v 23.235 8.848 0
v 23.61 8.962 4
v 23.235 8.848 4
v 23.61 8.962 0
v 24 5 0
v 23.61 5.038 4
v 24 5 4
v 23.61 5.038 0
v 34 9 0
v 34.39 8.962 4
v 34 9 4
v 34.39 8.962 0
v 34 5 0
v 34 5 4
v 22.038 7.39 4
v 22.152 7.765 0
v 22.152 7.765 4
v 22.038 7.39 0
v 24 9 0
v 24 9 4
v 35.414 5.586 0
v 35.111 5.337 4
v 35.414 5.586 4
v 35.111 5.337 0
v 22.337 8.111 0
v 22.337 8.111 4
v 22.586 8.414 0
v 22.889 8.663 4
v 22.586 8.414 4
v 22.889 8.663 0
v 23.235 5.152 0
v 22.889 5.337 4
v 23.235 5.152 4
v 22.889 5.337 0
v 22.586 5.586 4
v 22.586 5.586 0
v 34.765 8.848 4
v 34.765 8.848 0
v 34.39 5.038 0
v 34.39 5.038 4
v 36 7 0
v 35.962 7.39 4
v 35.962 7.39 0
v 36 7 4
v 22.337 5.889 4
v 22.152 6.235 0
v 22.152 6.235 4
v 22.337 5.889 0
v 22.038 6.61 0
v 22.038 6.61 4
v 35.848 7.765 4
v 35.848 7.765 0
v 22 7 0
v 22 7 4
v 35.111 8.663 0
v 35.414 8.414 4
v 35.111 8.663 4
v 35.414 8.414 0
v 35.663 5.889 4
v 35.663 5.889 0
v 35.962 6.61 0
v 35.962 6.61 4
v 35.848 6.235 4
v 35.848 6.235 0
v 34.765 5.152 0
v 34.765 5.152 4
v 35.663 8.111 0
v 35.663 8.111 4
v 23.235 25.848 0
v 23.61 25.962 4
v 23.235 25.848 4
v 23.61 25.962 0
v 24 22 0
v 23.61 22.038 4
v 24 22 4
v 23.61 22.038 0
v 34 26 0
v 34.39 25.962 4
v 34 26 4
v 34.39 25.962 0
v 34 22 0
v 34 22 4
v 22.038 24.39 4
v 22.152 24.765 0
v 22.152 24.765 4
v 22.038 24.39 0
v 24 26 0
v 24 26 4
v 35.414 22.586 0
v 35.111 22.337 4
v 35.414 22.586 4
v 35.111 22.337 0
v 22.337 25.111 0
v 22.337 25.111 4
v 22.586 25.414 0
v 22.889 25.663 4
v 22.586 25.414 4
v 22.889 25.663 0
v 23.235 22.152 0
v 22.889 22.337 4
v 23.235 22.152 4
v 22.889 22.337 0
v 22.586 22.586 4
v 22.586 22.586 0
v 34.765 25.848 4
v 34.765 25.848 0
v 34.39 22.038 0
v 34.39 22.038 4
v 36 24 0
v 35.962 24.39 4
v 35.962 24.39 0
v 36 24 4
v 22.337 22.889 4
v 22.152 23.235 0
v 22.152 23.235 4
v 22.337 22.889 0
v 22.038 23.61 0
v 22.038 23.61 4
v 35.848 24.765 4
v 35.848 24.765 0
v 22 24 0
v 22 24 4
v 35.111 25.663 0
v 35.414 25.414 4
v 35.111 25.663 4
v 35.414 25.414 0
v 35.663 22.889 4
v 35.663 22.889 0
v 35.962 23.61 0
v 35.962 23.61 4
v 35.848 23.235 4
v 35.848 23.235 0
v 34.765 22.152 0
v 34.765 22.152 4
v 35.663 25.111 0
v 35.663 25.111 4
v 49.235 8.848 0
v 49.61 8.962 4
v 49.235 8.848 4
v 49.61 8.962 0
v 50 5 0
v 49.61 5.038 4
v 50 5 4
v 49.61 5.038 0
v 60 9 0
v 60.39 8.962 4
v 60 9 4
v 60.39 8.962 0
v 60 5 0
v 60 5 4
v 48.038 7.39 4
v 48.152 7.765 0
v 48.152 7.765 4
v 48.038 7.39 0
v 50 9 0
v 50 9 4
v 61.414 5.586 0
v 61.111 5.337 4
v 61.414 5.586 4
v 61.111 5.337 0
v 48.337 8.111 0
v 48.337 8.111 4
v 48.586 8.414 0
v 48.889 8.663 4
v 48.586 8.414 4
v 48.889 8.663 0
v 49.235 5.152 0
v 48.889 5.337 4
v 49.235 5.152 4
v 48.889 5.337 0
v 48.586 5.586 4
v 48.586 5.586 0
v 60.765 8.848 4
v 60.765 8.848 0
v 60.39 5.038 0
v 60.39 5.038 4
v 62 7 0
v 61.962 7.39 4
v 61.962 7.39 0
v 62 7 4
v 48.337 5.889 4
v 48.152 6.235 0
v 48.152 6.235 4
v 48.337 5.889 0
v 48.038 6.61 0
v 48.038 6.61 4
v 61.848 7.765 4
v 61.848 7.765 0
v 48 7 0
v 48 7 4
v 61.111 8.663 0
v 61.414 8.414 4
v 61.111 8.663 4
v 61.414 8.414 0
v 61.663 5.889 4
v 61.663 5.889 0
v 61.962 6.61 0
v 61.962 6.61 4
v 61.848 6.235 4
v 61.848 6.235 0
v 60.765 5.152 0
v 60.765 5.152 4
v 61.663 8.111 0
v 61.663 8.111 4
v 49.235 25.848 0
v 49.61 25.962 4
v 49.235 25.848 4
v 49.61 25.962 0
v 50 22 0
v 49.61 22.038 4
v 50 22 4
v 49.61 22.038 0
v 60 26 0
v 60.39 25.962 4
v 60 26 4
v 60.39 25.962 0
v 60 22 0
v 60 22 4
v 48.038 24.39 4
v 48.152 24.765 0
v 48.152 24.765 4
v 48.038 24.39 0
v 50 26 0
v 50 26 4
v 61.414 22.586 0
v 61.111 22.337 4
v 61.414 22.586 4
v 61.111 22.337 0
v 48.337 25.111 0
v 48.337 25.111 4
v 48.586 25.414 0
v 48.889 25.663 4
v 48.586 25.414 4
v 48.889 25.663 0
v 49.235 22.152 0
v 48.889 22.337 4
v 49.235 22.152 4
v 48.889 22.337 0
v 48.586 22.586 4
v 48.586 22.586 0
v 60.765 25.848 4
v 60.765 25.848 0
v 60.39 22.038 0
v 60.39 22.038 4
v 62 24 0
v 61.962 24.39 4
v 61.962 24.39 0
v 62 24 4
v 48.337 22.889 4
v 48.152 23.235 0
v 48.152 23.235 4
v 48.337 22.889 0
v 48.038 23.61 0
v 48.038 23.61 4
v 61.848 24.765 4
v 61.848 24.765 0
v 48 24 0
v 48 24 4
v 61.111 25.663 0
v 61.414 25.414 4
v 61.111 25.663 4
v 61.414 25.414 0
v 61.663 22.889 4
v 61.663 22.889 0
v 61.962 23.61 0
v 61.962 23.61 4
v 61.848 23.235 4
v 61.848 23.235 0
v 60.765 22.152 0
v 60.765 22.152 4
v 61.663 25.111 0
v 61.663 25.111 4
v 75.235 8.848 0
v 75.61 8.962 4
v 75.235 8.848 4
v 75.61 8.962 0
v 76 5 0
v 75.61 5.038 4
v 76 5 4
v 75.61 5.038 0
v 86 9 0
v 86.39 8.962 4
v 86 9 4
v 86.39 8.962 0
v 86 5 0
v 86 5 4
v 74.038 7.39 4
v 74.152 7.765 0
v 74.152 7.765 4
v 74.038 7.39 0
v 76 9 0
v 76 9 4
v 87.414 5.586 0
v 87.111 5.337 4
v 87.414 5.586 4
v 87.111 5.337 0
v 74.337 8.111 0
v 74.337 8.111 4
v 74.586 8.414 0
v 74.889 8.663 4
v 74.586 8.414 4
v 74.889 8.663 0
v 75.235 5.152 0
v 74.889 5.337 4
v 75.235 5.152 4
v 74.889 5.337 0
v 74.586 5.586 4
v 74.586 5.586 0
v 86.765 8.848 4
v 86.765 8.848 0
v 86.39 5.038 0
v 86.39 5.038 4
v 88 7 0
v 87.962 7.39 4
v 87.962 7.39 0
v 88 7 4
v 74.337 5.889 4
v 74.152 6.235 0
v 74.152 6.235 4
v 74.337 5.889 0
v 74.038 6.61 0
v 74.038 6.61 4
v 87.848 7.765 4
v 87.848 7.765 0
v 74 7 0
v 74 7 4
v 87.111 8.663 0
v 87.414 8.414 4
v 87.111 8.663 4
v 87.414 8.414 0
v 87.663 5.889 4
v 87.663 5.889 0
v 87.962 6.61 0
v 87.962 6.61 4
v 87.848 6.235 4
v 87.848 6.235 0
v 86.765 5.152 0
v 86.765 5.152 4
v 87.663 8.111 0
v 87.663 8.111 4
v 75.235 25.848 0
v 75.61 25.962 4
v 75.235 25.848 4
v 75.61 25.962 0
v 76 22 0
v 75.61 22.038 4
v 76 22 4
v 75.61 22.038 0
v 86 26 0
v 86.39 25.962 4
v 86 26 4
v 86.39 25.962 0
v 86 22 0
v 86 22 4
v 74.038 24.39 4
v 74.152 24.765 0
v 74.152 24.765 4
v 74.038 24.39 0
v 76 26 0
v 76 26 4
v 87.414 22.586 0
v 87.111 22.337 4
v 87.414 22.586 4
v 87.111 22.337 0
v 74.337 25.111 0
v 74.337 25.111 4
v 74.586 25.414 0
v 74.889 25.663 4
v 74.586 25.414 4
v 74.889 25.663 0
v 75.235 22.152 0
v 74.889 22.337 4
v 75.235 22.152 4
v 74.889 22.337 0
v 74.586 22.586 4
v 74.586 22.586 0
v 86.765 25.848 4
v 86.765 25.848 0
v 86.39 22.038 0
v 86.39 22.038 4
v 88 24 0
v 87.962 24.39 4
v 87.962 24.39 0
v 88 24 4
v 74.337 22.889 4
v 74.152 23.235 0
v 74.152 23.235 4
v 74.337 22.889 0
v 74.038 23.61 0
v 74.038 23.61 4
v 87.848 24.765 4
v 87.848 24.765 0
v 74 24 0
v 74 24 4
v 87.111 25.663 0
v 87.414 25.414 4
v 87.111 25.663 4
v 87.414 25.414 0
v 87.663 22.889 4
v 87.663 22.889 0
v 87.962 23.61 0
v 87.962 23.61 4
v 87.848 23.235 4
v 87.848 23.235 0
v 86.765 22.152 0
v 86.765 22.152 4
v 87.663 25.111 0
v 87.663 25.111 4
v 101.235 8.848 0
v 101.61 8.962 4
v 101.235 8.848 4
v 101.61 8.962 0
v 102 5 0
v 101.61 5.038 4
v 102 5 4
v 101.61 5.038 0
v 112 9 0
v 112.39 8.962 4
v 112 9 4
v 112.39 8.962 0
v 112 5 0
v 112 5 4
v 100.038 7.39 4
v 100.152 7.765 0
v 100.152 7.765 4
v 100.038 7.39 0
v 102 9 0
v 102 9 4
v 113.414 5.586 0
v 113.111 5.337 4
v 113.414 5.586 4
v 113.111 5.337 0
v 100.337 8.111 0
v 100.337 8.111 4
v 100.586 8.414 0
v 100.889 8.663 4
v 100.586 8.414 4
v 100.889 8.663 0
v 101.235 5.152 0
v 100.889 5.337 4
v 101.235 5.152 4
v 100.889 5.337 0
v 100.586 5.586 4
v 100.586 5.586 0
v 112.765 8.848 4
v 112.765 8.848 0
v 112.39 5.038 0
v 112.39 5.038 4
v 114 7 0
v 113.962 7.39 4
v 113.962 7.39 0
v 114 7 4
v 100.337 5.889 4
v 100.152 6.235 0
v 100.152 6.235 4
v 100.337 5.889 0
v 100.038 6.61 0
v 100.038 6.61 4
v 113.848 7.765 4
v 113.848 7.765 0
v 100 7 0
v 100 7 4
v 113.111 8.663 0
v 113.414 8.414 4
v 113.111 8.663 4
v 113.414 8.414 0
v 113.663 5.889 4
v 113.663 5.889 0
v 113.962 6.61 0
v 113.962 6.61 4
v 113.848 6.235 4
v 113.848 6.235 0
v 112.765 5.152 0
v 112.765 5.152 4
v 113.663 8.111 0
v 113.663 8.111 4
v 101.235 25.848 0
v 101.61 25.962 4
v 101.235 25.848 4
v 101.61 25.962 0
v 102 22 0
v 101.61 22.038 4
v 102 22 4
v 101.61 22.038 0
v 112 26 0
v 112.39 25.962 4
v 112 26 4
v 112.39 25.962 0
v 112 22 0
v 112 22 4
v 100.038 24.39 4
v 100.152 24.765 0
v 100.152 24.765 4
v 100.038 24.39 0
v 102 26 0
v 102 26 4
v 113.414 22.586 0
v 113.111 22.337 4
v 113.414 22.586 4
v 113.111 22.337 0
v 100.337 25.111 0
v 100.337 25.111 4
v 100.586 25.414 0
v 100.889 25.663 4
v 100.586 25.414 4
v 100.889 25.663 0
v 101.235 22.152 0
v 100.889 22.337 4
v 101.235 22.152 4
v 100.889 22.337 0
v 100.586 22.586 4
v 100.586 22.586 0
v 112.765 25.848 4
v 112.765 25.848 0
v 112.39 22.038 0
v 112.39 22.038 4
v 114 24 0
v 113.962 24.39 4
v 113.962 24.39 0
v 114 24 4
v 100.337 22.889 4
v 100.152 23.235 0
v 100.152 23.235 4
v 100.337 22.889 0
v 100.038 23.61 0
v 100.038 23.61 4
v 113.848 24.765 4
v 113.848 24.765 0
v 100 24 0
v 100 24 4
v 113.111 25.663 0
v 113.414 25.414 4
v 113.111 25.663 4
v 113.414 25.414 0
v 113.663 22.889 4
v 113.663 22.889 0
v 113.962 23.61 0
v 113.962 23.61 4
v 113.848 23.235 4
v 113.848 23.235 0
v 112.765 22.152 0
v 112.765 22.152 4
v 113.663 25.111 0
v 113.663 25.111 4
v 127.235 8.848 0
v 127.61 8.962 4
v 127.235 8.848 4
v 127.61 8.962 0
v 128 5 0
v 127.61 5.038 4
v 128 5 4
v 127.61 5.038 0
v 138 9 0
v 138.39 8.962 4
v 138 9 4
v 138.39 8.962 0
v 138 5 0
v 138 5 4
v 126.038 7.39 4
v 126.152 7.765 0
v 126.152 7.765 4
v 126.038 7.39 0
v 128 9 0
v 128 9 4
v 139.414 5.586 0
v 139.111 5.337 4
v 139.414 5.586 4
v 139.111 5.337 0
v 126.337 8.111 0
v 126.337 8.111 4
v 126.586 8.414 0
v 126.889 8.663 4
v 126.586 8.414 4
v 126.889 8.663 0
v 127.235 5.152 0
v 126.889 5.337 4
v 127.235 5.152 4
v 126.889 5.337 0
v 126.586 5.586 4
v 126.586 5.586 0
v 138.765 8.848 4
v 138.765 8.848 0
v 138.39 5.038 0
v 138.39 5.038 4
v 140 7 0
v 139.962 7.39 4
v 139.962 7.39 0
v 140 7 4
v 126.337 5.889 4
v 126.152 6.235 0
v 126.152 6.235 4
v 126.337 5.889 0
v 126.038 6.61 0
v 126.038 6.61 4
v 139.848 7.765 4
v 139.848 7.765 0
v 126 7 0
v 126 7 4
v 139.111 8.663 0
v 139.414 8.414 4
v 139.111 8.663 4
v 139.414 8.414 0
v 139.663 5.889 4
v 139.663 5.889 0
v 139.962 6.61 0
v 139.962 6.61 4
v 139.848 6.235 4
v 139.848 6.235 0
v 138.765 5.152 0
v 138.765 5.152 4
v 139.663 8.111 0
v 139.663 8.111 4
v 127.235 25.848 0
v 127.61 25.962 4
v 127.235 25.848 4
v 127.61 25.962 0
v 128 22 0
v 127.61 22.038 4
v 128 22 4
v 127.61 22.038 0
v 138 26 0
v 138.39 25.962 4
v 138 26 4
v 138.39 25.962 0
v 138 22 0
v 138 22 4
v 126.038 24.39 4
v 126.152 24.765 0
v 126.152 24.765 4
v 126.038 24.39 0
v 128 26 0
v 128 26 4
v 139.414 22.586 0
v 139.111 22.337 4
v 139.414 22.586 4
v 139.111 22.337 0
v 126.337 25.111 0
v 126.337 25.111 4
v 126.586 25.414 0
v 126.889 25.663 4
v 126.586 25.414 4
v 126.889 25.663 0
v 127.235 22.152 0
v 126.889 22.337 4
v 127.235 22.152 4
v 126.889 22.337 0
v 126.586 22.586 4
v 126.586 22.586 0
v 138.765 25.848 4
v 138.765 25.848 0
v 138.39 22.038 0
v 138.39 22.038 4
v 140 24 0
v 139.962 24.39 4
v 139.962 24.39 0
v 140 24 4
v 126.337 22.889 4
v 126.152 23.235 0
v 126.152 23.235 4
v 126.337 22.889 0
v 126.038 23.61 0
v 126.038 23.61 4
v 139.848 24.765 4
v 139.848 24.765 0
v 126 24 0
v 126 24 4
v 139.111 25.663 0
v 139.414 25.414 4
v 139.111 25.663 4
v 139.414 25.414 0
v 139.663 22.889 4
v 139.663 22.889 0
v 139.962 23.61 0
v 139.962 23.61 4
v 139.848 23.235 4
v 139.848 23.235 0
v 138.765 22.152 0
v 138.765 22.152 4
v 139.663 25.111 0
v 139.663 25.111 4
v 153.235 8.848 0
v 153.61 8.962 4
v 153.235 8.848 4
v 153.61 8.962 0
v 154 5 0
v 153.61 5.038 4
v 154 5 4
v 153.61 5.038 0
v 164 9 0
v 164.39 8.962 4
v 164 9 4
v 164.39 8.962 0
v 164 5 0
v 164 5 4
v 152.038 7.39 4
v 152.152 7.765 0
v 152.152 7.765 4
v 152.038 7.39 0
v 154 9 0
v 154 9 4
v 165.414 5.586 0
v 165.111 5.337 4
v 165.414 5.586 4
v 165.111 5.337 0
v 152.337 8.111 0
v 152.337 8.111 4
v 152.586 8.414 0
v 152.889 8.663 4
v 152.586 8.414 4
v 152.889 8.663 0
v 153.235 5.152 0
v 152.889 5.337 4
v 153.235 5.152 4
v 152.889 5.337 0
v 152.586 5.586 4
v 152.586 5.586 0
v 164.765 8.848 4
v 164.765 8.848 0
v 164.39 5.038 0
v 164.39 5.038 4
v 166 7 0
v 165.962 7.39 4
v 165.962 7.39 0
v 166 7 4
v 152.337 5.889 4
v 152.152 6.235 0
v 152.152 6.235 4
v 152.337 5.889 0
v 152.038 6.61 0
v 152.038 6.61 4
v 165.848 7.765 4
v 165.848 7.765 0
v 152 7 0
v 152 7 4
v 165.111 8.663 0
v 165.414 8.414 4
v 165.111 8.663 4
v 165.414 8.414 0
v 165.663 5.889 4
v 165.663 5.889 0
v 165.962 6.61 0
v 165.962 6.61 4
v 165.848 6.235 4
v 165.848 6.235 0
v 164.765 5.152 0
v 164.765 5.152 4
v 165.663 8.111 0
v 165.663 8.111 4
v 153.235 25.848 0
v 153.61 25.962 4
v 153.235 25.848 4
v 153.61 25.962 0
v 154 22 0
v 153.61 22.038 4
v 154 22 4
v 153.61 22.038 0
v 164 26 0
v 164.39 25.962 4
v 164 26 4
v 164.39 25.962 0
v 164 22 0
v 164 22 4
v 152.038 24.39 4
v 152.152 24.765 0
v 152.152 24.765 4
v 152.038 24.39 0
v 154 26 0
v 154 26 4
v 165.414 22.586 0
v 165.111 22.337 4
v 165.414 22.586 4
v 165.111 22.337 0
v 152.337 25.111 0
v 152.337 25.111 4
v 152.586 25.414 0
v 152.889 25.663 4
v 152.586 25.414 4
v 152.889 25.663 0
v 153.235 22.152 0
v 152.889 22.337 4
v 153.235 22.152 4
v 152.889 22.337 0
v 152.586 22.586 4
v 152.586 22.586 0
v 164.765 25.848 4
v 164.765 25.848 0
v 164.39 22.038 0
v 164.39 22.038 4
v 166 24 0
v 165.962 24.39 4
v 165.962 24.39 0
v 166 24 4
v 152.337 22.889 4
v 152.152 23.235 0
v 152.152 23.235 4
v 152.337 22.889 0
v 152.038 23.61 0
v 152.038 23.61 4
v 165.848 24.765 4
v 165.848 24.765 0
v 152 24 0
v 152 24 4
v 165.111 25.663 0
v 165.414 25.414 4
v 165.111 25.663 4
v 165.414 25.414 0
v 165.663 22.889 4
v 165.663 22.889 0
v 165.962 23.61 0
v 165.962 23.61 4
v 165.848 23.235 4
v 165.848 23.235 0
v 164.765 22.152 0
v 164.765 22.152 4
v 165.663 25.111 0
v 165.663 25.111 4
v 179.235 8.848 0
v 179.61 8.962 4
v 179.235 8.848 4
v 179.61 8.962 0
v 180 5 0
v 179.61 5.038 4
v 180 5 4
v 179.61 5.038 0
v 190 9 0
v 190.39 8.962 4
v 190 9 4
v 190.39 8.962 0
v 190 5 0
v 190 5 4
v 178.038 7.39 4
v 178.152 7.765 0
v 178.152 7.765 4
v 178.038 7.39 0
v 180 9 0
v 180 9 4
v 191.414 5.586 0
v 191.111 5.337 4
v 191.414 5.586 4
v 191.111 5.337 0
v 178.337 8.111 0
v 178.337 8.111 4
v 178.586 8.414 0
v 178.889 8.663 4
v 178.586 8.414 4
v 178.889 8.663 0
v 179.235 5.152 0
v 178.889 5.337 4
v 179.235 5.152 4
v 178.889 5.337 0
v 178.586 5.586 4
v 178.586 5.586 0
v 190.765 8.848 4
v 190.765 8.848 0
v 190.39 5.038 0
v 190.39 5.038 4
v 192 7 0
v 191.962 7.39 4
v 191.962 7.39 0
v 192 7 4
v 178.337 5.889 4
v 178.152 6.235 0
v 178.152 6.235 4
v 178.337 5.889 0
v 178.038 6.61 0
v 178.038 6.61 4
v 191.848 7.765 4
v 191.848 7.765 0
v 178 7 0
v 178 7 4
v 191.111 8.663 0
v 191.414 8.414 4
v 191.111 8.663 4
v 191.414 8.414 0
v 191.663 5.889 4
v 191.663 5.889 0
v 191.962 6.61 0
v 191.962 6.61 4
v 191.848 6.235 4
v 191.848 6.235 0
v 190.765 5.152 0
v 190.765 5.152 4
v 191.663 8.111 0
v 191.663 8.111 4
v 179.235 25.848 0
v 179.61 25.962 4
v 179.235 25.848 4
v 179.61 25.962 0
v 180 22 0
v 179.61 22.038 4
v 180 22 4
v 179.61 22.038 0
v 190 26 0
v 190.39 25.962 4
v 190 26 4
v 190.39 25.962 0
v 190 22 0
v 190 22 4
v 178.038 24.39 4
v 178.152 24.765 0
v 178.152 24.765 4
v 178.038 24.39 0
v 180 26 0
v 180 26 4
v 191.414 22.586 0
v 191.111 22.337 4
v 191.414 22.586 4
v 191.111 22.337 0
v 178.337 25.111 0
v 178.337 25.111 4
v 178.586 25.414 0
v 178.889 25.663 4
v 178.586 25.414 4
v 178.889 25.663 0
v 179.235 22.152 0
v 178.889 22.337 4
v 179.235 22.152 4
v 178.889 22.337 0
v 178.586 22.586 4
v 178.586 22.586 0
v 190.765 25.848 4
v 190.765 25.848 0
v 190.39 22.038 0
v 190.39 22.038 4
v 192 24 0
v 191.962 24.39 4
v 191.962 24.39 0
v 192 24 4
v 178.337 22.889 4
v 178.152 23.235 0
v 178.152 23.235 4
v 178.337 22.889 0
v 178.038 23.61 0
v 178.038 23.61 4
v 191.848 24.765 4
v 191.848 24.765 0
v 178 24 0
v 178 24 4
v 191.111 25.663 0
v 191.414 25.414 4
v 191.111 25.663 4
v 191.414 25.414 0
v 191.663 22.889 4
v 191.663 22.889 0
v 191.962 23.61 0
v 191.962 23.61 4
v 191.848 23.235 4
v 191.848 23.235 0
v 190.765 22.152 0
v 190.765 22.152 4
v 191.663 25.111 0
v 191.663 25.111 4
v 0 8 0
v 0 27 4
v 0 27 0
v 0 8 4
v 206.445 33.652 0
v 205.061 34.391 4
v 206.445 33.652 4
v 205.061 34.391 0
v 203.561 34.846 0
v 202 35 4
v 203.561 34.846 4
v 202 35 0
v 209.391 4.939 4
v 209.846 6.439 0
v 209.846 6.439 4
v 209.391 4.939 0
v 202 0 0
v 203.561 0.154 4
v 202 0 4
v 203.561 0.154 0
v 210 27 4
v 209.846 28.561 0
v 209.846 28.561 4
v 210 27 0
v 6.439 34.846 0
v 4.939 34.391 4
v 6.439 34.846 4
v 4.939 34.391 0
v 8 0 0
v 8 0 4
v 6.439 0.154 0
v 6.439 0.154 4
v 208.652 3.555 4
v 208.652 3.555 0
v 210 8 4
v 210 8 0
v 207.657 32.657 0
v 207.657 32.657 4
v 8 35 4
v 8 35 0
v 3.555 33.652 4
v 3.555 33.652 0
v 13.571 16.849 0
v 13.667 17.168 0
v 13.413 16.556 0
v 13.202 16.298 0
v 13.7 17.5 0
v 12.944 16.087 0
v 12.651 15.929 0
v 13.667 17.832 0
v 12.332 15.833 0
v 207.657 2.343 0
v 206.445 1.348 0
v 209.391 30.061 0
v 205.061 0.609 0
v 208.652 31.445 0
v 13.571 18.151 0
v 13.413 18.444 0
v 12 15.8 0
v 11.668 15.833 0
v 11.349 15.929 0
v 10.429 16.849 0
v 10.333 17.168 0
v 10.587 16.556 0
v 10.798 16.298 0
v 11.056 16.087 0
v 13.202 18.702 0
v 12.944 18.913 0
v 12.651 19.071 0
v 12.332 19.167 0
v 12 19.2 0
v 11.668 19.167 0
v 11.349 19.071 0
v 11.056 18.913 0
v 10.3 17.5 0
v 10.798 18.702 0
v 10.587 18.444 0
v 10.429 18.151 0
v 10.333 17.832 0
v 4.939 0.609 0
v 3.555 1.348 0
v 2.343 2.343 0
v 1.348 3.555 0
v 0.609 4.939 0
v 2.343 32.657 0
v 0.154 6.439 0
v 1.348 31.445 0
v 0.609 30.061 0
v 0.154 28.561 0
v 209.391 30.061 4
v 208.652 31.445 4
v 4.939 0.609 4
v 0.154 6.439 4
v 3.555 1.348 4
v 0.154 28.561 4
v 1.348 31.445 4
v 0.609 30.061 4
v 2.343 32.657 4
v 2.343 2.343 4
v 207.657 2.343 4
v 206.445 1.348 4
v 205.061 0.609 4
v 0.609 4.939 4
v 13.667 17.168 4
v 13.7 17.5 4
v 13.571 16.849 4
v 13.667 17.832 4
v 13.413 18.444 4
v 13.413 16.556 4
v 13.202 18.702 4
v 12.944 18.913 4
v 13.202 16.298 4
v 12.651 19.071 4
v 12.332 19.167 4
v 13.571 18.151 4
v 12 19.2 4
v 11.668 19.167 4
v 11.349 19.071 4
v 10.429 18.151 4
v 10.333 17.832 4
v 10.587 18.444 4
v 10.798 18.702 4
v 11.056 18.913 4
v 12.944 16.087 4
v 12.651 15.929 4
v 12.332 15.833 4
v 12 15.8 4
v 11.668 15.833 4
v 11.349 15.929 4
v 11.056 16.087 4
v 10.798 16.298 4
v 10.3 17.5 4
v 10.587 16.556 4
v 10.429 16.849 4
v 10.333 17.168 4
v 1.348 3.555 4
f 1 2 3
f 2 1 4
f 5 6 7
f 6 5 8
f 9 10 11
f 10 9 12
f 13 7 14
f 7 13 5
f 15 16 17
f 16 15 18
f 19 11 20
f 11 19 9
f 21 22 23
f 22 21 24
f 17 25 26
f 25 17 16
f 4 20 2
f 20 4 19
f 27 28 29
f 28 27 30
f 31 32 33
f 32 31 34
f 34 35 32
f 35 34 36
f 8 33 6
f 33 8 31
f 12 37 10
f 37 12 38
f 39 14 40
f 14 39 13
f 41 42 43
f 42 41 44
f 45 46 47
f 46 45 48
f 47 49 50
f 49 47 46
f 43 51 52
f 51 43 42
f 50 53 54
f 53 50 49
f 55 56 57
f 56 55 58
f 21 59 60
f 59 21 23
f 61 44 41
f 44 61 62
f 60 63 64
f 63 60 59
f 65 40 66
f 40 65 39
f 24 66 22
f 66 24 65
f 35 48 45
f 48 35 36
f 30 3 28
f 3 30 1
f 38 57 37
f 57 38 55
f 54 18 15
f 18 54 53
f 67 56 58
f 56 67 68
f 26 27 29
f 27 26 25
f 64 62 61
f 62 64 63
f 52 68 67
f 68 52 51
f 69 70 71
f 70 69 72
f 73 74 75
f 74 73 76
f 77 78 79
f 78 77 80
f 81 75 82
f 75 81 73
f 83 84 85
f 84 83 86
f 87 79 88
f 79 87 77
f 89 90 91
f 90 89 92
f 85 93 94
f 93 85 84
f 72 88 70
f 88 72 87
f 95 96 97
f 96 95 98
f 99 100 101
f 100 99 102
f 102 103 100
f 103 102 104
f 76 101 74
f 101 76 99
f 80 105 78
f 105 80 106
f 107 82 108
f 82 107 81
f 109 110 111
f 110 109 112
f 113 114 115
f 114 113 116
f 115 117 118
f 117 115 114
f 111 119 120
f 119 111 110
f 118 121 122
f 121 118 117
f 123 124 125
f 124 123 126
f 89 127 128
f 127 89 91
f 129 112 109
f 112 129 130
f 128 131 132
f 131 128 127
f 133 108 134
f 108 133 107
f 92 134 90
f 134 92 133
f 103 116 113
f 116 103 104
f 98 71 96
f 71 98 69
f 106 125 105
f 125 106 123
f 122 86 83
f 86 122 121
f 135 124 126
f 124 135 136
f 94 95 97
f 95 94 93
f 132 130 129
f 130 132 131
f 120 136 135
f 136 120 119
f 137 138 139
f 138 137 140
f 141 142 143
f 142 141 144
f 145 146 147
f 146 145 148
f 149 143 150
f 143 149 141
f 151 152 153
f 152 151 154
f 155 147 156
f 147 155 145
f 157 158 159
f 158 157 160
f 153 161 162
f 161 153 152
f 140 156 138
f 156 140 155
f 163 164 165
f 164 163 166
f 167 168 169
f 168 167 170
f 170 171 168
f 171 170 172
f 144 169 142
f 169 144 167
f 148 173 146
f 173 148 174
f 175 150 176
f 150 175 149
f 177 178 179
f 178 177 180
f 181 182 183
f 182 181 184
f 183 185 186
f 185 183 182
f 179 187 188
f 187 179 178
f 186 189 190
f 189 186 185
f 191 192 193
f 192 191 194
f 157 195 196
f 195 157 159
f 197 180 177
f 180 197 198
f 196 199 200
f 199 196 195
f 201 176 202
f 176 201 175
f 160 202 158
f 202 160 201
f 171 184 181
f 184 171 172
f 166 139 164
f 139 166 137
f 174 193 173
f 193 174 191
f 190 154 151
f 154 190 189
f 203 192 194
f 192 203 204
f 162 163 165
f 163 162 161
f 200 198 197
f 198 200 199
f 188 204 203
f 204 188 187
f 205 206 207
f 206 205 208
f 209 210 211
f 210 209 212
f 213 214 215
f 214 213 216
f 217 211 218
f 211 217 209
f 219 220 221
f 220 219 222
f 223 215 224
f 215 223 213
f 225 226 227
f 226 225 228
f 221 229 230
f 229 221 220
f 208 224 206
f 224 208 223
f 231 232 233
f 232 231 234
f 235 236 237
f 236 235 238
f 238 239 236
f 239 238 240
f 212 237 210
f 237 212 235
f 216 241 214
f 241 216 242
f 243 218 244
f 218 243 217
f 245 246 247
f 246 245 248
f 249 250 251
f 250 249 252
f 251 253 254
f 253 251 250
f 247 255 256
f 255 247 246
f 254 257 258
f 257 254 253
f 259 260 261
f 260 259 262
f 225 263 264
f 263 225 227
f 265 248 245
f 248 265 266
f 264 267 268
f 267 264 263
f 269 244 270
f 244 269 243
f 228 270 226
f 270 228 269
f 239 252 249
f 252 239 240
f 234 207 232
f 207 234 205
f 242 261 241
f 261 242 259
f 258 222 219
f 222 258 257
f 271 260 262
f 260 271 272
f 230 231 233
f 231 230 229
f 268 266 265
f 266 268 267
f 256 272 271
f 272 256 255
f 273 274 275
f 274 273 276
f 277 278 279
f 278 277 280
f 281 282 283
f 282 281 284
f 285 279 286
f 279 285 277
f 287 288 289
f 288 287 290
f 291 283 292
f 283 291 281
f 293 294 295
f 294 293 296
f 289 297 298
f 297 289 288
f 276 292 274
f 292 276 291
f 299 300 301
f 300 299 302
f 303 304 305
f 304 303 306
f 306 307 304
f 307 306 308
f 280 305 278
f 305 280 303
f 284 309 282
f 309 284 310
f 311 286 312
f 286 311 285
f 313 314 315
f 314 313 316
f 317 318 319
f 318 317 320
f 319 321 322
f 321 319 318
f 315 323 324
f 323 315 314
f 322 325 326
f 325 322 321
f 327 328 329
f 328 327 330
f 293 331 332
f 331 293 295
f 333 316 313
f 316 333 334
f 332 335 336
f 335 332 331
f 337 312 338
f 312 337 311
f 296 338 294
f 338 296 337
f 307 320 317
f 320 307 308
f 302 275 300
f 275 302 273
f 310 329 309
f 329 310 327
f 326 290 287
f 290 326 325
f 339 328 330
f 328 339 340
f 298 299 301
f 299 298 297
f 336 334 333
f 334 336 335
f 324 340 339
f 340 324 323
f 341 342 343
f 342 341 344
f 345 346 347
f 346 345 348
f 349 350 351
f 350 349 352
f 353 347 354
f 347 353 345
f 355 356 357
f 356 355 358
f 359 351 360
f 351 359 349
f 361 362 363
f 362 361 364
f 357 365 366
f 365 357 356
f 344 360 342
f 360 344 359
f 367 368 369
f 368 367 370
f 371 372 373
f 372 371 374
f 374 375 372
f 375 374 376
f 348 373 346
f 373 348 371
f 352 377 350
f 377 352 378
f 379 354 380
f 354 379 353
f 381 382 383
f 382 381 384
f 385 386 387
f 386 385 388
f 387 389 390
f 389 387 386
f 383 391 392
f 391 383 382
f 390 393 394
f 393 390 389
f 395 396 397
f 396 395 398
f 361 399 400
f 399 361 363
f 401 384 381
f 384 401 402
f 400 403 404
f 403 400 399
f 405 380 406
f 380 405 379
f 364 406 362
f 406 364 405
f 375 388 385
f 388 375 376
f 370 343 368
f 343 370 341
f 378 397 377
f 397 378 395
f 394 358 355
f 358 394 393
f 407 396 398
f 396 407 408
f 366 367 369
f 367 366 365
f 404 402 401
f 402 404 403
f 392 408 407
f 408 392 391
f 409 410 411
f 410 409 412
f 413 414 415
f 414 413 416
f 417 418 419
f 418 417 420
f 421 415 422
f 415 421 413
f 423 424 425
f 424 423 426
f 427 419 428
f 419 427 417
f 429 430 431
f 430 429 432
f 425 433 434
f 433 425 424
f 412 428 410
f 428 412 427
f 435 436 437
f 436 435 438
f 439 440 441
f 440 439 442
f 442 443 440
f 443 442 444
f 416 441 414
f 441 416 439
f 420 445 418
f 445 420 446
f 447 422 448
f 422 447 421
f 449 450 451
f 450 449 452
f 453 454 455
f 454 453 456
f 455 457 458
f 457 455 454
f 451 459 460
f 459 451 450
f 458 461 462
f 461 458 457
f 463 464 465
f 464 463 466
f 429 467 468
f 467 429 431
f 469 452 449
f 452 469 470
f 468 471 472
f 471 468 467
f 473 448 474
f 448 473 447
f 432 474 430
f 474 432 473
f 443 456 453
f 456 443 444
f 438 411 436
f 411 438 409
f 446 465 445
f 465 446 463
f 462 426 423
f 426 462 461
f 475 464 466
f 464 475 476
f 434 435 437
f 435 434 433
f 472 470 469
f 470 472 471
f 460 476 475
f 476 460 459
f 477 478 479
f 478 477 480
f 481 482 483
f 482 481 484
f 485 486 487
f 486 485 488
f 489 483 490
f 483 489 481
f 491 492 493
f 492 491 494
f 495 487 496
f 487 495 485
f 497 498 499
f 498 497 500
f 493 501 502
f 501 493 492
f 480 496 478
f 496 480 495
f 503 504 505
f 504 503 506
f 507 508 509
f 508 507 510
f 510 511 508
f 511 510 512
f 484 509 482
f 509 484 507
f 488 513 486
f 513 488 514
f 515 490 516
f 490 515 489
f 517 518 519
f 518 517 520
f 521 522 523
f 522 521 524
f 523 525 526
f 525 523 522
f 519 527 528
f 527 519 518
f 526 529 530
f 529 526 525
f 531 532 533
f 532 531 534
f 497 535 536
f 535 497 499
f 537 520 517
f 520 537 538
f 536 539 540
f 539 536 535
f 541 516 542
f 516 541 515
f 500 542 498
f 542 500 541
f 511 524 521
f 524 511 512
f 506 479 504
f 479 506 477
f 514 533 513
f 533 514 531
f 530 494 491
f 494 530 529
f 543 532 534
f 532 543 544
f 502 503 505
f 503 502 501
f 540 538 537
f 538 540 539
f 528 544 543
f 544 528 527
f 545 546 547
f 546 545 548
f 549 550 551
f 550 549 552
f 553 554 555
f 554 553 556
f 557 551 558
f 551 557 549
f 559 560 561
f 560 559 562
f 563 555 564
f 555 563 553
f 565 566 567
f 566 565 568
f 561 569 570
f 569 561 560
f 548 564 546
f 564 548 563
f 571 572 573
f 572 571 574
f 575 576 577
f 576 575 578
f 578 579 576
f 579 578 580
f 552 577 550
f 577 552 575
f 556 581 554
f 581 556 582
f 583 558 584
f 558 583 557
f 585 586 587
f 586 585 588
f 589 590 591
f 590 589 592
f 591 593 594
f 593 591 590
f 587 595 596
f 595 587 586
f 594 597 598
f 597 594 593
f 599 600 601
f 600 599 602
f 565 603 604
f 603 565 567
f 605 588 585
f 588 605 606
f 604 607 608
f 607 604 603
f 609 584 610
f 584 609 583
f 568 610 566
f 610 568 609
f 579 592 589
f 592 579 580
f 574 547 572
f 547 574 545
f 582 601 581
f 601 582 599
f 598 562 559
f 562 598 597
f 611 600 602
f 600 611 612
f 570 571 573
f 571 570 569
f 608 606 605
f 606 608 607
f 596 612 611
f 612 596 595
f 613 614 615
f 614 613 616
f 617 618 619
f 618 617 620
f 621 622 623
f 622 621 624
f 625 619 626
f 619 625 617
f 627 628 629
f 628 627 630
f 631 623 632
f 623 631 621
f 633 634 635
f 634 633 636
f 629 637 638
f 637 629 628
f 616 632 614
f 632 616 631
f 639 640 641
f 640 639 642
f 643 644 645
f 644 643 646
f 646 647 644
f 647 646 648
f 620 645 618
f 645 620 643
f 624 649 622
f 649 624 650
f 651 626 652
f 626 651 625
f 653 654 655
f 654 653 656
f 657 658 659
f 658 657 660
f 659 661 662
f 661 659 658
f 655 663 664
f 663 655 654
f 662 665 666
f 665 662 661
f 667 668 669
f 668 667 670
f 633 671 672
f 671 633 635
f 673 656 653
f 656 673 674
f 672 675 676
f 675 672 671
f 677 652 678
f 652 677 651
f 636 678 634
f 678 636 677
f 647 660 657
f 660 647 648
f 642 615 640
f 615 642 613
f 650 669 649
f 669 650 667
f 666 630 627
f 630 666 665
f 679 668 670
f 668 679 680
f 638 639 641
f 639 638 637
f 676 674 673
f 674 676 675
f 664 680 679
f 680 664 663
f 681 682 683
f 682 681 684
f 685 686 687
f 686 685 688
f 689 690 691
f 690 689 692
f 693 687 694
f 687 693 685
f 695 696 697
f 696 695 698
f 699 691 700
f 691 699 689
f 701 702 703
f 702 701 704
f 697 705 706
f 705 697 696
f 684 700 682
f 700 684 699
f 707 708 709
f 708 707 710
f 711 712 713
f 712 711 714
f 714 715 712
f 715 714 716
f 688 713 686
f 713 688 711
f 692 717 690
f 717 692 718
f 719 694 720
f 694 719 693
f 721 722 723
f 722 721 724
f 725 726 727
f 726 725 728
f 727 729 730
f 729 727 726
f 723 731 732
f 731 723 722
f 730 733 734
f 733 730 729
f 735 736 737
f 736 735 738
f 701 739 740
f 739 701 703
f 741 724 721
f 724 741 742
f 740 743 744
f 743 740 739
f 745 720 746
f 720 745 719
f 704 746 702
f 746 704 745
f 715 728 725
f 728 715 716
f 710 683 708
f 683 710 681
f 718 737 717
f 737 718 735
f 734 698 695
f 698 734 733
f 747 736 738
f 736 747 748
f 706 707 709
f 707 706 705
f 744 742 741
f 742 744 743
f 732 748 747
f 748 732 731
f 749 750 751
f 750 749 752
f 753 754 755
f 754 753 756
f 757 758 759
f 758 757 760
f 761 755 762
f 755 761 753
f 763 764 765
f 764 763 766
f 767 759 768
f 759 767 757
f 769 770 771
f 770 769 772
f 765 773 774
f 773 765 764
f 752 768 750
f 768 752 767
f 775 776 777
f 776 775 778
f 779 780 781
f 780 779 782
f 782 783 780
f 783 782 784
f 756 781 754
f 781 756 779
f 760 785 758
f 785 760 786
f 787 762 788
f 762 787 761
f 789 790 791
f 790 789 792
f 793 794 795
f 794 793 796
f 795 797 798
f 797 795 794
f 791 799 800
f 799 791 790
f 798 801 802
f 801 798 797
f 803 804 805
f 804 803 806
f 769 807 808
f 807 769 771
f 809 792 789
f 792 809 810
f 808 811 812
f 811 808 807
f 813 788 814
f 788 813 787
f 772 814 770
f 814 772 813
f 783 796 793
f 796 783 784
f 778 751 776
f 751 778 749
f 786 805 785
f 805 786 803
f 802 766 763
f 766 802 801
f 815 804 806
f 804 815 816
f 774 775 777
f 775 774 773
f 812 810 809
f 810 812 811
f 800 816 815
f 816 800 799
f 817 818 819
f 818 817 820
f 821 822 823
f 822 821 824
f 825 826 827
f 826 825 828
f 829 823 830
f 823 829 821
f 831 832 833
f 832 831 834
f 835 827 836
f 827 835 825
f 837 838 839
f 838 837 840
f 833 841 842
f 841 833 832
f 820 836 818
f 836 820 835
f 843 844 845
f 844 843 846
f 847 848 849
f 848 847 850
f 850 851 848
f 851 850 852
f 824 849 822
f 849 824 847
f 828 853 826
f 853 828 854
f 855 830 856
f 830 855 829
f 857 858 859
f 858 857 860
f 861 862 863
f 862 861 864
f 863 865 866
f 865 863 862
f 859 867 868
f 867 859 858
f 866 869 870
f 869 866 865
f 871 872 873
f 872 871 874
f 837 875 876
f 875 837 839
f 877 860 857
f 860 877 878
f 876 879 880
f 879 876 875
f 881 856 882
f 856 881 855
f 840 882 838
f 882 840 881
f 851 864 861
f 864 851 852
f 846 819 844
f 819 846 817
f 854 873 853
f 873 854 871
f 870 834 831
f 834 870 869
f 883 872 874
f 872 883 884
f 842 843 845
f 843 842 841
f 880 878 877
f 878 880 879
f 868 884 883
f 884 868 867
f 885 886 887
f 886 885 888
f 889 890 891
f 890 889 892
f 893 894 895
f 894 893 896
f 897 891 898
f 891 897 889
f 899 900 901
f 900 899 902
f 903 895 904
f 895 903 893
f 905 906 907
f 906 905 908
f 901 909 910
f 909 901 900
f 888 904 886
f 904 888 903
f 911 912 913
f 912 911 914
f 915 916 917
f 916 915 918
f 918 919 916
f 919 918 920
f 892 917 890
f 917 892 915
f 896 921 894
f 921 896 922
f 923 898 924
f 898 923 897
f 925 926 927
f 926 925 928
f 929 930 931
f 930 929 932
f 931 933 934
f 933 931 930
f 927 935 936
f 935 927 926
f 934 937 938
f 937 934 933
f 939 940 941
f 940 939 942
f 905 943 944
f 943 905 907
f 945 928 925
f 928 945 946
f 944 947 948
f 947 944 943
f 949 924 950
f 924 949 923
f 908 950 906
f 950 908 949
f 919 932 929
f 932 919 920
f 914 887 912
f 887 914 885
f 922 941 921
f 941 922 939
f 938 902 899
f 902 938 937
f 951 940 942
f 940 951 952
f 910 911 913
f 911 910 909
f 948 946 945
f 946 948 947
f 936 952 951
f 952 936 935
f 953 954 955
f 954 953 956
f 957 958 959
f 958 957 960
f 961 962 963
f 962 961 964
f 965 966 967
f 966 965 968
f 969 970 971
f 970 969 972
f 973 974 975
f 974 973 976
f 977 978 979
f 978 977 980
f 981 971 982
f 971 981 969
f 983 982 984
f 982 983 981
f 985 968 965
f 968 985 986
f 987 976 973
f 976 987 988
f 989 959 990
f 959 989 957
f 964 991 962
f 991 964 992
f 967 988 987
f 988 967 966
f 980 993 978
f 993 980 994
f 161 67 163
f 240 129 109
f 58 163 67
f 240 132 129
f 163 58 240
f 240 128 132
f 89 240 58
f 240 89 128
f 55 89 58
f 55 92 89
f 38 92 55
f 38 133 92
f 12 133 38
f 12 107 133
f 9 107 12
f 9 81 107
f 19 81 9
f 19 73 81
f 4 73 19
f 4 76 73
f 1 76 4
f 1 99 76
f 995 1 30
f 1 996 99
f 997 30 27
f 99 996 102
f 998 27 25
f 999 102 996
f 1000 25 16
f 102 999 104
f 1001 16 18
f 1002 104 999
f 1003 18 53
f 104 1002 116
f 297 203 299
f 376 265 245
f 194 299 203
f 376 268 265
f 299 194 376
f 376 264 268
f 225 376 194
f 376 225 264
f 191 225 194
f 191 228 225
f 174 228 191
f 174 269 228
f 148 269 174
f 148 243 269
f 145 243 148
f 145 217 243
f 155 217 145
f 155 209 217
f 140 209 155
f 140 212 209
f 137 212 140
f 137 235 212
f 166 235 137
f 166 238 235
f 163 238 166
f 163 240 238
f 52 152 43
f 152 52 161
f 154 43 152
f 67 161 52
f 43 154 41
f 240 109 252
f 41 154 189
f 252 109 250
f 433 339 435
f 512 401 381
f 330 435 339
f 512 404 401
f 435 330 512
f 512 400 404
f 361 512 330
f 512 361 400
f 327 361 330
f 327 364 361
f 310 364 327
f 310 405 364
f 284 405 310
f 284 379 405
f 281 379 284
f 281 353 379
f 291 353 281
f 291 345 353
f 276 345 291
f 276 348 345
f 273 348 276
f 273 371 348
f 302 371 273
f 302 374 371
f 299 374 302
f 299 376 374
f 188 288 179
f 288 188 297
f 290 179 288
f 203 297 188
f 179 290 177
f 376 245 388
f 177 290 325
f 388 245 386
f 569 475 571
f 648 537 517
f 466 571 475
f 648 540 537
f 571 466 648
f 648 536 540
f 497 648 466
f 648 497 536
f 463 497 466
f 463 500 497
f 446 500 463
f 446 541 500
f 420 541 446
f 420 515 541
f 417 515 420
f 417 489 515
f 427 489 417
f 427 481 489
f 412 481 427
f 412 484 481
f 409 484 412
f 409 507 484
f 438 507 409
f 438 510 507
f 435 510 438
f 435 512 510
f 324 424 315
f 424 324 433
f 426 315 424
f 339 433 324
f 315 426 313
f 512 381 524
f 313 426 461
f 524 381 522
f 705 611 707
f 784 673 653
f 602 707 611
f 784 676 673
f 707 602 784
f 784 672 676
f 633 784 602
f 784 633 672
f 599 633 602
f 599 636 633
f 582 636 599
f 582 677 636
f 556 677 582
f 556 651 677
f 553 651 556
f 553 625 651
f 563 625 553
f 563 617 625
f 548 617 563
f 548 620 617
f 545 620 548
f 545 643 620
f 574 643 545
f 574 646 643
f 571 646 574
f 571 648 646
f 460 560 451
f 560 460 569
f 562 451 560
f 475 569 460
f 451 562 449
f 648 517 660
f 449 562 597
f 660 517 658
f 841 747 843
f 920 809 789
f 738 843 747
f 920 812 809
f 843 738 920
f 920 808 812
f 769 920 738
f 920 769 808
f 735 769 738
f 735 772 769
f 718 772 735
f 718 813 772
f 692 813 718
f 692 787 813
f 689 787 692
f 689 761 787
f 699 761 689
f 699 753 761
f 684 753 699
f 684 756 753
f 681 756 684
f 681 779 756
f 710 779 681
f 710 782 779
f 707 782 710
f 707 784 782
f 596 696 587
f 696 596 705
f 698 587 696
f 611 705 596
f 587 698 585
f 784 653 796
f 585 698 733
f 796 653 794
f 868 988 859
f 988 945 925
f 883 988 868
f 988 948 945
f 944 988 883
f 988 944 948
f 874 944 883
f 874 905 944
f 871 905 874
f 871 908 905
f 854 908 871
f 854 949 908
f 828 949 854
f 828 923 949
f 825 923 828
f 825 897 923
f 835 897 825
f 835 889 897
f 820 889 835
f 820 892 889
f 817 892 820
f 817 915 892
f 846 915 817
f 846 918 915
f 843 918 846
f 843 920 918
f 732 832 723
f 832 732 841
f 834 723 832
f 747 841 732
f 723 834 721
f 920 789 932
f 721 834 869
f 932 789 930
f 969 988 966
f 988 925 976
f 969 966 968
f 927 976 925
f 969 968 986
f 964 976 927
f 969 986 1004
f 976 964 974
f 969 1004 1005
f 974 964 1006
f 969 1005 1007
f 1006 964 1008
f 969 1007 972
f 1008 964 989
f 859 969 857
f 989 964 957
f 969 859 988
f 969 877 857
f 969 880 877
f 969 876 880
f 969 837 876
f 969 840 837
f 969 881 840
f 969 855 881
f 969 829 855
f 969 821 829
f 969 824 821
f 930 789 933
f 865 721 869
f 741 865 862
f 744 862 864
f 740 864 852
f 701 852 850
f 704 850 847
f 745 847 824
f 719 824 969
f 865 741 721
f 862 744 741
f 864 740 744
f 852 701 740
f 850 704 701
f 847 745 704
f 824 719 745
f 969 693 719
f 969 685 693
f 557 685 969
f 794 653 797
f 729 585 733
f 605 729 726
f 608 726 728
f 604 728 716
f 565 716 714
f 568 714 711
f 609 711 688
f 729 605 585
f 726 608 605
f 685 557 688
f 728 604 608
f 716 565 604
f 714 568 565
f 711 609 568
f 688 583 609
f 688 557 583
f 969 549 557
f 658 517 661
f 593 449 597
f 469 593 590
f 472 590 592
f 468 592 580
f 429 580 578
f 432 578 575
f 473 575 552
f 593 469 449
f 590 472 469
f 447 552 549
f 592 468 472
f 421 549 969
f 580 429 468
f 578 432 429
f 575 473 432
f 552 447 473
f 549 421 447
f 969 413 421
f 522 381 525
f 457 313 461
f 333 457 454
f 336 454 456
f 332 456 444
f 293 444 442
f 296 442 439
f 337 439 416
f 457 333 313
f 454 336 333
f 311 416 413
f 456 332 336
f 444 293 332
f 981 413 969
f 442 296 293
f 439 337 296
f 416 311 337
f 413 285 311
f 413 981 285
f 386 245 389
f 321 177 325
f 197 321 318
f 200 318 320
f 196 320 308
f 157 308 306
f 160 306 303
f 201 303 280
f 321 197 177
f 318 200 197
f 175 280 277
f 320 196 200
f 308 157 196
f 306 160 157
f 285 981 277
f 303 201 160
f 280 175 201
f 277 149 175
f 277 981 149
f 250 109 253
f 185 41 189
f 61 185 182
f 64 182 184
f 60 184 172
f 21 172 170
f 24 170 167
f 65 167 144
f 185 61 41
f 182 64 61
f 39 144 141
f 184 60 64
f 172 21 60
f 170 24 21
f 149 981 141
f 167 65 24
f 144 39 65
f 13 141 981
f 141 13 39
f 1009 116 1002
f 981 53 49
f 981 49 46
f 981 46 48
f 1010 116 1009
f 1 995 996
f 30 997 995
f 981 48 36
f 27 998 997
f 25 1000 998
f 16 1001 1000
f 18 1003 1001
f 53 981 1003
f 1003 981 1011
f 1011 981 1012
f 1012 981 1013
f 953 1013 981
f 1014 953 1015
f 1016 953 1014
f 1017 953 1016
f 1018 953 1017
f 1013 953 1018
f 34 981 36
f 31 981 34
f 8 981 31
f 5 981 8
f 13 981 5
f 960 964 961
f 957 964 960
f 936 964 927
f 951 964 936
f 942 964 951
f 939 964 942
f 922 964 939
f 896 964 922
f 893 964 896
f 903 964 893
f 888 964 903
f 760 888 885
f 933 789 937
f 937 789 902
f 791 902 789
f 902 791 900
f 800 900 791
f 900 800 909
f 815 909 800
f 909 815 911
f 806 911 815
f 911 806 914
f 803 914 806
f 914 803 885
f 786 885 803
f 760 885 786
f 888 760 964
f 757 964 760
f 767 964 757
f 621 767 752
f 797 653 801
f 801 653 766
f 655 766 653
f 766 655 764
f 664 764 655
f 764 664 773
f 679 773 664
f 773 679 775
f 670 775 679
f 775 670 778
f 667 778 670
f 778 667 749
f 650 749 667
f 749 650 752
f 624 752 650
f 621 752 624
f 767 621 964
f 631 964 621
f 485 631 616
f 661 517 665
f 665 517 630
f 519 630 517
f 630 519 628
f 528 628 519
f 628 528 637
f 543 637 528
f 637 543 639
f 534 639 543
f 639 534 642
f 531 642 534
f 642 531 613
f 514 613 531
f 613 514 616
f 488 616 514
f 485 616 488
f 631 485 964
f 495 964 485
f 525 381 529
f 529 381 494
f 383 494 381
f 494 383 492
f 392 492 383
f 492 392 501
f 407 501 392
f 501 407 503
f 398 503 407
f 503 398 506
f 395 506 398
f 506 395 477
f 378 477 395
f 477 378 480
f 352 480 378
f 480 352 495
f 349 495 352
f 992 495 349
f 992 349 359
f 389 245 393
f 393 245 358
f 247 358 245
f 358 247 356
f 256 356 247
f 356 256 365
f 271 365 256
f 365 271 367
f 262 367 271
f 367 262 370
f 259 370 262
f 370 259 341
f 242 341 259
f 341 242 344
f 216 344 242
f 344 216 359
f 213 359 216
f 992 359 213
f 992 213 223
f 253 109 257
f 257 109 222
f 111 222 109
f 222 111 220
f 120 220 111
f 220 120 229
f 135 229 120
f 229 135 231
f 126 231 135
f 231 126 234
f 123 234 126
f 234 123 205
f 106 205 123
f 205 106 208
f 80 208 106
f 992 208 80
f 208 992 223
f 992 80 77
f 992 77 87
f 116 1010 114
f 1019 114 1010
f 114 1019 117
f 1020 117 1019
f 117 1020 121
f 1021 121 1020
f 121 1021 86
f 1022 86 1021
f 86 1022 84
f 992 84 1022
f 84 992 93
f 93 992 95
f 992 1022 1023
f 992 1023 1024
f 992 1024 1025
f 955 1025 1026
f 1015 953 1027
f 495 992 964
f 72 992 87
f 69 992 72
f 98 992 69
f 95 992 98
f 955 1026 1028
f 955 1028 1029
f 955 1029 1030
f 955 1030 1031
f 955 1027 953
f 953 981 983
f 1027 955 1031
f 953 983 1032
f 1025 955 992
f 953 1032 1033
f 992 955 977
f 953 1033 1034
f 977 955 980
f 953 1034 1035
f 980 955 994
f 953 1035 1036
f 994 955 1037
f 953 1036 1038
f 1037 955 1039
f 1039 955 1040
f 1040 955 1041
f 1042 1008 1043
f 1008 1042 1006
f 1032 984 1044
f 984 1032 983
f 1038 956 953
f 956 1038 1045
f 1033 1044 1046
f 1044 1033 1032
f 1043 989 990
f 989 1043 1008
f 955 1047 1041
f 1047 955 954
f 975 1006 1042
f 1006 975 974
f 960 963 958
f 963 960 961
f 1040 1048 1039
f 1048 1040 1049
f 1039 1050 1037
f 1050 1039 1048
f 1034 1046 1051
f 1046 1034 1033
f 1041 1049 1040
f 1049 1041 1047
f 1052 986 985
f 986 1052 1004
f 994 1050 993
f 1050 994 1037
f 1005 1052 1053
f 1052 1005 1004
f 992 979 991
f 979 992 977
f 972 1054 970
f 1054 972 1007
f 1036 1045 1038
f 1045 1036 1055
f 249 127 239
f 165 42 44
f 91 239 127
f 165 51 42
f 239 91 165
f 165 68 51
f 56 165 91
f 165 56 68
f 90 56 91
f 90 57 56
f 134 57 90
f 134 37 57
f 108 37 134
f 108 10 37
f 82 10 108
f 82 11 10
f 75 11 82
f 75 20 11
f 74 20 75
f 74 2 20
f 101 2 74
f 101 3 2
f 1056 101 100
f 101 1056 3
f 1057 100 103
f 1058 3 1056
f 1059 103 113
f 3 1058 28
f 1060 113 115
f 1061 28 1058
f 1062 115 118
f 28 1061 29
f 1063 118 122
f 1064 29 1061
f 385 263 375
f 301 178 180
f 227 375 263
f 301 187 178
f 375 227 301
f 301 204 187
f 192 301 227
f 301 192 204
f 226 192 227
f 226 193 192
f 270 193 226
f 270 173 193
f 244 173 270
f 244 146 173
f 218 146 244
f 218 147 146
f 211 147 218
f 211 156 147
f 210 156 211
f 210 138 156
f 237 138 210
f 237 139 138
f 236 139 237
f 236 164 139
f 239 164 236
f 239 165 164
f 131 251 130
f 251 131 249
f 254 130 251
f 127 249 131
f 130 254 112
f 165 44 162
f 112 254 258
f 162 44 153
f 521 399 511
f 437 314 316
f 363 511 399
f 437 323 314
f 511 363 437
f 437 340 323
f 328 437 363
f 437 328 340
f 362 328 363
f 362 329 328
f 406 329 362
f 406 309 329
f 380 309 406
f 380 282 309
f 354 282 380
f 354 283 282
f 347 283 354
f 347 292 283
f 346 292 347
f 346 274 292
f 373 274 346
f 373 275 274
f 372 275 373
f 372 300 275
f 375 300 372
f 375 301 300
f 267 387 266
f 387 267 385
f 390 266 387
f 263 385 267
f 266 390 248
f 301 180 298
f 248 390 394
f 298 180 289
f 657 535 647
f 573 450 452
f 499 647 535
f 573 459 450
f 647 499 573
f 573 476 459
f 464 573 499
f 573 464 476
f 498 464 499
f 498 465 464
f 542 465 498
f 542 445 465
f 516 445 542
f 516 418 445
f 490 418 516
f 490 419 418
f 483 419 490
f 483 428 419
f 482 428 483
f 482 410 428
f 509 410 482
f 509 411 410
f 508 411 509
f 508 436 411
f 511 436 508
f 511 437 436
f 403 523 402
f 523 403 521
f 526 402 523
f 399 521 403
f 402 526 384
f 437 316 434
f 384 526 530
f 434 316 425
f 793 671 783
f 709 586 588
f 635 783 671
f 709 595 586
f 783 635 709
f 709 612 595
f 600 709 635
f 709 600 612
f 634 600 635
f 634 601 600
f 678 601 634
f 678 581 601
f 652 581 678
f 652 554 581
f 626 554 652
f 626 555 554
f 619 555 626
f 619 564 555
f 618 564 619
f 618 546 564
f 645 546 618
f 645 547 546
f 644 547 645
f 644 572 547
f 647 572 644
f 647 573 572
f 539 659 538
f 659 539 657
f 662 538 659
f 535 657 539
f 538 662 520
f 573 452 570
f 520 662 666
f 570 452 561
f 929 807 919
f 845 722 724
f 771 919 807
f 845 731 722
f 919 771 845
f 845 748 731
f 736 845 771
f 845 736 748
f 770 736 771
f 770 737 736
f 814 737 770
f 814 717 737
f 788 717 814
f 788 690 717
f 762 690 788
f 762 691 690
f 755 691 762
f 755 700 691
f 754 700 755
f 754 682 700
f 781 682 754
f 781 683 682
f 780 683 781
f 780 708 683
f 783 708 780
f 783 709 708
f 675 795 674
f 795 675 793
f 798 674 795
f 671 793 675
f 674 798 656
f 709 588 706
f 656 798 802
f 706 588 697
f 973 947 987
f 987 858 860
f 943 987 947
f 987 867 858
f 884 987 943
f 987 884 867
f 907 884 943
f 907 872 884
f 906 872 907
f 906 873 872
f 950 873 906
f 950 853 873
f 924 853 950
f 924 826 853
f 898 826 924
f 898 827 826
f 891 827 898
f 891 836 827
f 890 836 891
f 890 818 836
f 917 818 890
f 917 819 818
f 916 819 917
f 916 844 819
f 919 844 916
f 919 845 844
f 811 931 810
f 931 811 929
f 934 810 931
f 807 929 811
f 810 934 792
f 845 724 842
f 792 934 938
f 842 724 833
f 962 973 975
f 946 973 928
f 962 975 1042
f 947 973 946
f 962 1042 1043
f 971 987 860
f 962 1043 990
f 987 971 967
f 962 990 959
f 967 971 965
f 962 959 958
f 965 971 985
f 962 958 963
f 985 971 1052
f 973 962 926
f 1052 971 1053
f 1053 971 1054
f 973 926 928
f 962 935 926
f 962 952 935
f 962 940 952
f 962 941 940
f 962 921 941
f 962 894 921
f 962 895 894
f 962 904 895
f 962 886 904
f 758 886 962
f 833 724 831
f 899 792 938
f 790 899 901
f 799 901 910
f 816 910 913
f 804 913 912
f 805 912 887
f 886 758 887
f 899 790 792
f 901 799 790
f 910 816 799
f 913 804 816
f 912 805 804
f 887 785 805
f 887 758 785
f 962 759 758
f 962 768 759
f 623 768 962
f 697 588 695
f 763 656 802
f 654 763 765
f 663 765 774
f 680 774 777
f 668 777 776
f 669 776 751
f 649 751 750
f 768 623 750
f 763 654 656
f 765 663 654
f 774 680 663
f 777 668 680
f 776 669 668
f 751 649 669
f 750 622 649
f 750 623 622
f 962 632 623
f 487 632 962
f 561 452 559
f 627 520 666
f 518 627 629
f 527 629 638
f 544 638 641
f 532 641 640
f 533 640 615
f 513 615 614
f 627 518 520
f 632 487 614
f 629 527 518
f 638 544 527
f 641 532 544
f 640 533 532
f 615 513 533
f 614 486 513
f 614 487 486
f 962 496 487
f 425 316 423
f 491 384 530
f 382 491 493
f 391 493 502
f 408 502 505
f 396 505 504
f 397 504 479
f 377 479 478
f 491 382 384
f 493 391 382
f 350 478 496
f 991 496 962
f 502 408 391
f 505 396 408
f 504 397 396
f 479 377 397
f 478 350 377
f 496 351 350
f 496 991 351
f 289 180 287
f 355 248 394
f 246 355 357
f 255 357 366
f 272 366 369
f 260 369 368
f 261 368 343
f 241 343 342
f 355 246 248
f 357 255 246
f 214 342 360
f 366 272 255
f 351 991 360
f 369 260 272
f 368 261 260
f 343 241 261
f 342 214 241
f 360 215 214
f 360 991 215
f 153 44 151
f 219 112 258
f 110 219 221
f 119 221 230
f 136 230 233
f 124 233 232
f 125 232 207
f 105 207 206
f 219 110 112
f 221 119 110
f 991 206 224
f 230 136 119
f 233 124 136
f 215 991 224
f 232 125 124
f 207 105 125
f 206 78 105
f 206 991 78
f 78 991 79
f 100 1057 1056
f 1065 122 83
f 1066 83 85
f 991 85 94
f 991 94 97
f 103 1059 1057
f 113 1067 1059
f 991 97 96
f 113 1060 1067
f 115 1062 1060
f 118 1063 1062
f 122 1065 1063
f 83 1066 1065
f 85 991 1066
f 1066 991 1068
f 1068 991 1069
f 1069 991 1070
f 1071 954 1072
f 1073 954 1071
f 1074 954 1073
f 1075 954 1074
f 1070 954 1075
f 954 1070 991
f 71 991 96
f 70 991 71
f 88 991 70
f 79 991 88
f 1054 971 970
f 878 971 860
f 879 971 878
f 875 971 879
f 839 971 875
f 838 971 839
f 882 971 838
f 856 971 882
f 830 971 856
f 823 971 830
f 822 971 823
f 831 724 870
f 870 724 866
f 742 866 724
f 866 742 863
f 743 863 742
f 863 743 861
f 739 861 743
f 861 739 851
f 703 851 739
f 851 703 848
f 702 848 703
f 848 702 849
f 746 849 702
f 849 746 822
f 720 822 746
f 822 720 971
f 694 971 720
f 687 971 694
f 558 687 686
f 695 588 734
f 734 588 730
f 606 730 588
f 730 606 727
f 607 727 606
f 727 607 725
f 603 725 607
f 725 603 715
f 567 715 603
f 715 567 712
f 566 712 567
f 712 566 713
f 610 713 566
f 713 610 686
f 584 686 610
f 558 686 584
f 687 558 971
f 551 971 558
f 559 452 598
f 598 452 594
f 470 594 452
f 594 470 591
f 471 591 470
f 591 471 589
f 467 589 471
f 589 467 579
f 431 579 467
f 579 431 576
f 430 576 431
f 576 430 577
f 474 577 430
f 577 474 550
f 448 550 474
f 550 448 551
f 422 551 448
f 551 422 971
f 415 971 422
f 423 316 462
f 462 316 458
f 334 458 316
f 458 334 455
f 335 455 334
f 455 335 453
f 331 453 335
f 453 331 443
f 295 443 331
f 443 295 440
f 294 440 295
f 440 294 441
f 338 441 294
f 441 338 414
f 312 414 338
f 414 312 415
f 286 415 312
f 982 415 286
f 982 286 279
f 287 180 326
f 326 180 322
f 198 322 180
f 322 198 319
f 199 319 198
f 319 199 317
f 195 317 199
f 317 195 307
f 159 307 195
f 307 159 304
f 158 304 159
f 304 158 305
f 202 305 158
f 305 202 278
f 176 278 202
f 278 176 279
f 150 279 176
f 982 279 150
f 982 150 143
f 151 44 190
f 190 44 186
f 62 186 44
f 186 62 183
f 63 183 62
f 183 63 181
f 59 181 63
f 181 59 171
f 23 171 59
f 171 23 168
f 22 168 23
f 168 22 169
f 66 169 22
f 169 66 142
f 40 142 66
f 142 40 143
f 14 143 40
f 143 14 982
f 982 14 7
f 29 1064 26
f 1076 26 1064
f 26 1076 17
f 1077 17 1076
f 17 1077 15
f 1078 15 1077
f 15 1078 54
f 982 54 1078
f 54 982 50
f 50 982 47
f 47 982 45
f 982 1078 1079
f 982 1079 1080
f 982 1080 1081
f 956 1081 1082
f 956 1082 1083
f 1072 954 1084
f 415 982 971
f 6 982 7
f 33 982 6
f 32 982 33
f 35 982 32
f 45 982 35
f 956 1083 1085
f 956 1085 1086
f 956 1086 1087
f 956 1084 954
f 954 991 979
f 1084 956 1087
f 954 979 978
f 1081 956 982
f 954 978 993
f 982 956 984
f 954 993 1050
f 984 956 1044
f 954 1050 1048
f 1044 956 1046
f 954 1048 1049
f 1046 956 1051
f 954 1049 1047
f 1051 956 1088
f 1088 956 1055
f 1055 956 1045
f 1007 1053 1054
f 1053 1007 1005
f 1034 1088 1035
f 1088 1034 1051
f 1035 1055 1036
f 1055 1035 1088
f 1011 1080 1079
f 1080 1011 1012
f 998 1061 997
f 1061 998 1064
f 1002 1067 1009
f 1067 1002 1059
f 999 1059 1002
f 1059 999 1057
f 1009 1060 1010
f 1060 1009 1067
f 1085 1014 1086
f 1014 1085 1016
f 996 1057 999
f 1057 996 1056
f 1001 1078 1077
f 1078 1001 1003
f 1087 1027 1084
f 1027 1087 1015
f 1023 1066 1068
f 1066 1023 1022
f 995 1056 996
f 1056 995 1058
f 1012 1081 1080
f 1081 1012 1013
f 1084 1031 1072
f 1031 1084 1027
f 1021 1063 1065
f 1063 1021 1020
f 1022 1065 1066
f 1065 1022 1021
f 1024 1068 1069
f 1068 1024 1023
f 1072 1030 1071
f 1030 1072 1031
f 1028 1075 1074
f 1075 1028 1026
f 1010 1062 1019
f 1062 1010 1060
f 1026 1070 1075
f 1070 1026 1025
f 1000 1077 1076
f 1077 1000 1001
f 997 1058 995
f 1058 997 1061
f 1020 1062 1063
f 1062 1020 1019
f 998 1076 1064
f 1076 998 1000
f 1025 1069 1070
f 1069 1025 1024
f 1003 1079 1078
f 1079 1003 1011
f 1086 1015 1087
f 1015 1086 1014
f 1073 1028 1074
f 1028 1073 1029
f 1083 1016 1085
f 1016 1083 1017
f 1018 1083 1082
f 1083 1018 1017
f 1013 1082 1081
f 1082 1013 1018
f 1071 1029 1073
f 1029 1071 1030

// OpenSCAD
// RenoScout moisture wand
// A flat paddle that carries the moisture-mapping sensors — the differentiator a
// depth camera can't do: DHT11 humidity/temp + a water-level sensor at the tip +
// HC-SR04 for stand-off distance. Sensors strap on with zip ties (like the chassis)
// so any module fits — no tight pockets to fail.
//
// OpenSCAD -> F6 -> Export STL. Cura: PLA, 0.2mm, 20% infill, NO supports, brim.
// Prints flat, ~210 x 35 x 4 mm (fits the 225 bed). Water sensor at the tip (touches
// damp surfaces), HC-SR04 near the tip (faces forward), DHT11 mid-handle (open air).
// Run the wires down between the slots to the Pi/Arduino.

Lw     = 210;  // length (fits the 225 bed)
Ww     = 35;   // width
Tw     = 4;    // thickness
Rw     = 8;    // grip / corner radius
hole_d = 3.4;  // M3 hang hole
slot_w = 4;    // zip-tie slot width
slot_l = 14;   // zip-tie slot length
$fn    = 32;

module rrect(l, w, t, r)
  hull() for (x = [r, l - r], y = [r, w - r]) translate([x, y]) cylinder(r = r, h = t);

module slot()  // rounded zip-tie slot, long axis along X
  hull() for (x = [slot_w / 2, slot_l - slot_w / 2]) translate([x, 0, -1]) cylinder(d = slot_w, h = Tw + 2);

difference() {
  rrect(Lw, Ww, Tw, Rw);

  // paired zip-tie slots along the wand -> strap any sensor module anywhere
  for (x = [22 : 26 : Lw - 28])
    for (y = [7, Ww - 7 - slot_w])
      translate([x, y]) slot();

  // hang / lanyard hole at the grip end
  translate([Rw + 4, Ww / 2, -1]) cylinder(d = hole_d, h = Tw + 2);
}
